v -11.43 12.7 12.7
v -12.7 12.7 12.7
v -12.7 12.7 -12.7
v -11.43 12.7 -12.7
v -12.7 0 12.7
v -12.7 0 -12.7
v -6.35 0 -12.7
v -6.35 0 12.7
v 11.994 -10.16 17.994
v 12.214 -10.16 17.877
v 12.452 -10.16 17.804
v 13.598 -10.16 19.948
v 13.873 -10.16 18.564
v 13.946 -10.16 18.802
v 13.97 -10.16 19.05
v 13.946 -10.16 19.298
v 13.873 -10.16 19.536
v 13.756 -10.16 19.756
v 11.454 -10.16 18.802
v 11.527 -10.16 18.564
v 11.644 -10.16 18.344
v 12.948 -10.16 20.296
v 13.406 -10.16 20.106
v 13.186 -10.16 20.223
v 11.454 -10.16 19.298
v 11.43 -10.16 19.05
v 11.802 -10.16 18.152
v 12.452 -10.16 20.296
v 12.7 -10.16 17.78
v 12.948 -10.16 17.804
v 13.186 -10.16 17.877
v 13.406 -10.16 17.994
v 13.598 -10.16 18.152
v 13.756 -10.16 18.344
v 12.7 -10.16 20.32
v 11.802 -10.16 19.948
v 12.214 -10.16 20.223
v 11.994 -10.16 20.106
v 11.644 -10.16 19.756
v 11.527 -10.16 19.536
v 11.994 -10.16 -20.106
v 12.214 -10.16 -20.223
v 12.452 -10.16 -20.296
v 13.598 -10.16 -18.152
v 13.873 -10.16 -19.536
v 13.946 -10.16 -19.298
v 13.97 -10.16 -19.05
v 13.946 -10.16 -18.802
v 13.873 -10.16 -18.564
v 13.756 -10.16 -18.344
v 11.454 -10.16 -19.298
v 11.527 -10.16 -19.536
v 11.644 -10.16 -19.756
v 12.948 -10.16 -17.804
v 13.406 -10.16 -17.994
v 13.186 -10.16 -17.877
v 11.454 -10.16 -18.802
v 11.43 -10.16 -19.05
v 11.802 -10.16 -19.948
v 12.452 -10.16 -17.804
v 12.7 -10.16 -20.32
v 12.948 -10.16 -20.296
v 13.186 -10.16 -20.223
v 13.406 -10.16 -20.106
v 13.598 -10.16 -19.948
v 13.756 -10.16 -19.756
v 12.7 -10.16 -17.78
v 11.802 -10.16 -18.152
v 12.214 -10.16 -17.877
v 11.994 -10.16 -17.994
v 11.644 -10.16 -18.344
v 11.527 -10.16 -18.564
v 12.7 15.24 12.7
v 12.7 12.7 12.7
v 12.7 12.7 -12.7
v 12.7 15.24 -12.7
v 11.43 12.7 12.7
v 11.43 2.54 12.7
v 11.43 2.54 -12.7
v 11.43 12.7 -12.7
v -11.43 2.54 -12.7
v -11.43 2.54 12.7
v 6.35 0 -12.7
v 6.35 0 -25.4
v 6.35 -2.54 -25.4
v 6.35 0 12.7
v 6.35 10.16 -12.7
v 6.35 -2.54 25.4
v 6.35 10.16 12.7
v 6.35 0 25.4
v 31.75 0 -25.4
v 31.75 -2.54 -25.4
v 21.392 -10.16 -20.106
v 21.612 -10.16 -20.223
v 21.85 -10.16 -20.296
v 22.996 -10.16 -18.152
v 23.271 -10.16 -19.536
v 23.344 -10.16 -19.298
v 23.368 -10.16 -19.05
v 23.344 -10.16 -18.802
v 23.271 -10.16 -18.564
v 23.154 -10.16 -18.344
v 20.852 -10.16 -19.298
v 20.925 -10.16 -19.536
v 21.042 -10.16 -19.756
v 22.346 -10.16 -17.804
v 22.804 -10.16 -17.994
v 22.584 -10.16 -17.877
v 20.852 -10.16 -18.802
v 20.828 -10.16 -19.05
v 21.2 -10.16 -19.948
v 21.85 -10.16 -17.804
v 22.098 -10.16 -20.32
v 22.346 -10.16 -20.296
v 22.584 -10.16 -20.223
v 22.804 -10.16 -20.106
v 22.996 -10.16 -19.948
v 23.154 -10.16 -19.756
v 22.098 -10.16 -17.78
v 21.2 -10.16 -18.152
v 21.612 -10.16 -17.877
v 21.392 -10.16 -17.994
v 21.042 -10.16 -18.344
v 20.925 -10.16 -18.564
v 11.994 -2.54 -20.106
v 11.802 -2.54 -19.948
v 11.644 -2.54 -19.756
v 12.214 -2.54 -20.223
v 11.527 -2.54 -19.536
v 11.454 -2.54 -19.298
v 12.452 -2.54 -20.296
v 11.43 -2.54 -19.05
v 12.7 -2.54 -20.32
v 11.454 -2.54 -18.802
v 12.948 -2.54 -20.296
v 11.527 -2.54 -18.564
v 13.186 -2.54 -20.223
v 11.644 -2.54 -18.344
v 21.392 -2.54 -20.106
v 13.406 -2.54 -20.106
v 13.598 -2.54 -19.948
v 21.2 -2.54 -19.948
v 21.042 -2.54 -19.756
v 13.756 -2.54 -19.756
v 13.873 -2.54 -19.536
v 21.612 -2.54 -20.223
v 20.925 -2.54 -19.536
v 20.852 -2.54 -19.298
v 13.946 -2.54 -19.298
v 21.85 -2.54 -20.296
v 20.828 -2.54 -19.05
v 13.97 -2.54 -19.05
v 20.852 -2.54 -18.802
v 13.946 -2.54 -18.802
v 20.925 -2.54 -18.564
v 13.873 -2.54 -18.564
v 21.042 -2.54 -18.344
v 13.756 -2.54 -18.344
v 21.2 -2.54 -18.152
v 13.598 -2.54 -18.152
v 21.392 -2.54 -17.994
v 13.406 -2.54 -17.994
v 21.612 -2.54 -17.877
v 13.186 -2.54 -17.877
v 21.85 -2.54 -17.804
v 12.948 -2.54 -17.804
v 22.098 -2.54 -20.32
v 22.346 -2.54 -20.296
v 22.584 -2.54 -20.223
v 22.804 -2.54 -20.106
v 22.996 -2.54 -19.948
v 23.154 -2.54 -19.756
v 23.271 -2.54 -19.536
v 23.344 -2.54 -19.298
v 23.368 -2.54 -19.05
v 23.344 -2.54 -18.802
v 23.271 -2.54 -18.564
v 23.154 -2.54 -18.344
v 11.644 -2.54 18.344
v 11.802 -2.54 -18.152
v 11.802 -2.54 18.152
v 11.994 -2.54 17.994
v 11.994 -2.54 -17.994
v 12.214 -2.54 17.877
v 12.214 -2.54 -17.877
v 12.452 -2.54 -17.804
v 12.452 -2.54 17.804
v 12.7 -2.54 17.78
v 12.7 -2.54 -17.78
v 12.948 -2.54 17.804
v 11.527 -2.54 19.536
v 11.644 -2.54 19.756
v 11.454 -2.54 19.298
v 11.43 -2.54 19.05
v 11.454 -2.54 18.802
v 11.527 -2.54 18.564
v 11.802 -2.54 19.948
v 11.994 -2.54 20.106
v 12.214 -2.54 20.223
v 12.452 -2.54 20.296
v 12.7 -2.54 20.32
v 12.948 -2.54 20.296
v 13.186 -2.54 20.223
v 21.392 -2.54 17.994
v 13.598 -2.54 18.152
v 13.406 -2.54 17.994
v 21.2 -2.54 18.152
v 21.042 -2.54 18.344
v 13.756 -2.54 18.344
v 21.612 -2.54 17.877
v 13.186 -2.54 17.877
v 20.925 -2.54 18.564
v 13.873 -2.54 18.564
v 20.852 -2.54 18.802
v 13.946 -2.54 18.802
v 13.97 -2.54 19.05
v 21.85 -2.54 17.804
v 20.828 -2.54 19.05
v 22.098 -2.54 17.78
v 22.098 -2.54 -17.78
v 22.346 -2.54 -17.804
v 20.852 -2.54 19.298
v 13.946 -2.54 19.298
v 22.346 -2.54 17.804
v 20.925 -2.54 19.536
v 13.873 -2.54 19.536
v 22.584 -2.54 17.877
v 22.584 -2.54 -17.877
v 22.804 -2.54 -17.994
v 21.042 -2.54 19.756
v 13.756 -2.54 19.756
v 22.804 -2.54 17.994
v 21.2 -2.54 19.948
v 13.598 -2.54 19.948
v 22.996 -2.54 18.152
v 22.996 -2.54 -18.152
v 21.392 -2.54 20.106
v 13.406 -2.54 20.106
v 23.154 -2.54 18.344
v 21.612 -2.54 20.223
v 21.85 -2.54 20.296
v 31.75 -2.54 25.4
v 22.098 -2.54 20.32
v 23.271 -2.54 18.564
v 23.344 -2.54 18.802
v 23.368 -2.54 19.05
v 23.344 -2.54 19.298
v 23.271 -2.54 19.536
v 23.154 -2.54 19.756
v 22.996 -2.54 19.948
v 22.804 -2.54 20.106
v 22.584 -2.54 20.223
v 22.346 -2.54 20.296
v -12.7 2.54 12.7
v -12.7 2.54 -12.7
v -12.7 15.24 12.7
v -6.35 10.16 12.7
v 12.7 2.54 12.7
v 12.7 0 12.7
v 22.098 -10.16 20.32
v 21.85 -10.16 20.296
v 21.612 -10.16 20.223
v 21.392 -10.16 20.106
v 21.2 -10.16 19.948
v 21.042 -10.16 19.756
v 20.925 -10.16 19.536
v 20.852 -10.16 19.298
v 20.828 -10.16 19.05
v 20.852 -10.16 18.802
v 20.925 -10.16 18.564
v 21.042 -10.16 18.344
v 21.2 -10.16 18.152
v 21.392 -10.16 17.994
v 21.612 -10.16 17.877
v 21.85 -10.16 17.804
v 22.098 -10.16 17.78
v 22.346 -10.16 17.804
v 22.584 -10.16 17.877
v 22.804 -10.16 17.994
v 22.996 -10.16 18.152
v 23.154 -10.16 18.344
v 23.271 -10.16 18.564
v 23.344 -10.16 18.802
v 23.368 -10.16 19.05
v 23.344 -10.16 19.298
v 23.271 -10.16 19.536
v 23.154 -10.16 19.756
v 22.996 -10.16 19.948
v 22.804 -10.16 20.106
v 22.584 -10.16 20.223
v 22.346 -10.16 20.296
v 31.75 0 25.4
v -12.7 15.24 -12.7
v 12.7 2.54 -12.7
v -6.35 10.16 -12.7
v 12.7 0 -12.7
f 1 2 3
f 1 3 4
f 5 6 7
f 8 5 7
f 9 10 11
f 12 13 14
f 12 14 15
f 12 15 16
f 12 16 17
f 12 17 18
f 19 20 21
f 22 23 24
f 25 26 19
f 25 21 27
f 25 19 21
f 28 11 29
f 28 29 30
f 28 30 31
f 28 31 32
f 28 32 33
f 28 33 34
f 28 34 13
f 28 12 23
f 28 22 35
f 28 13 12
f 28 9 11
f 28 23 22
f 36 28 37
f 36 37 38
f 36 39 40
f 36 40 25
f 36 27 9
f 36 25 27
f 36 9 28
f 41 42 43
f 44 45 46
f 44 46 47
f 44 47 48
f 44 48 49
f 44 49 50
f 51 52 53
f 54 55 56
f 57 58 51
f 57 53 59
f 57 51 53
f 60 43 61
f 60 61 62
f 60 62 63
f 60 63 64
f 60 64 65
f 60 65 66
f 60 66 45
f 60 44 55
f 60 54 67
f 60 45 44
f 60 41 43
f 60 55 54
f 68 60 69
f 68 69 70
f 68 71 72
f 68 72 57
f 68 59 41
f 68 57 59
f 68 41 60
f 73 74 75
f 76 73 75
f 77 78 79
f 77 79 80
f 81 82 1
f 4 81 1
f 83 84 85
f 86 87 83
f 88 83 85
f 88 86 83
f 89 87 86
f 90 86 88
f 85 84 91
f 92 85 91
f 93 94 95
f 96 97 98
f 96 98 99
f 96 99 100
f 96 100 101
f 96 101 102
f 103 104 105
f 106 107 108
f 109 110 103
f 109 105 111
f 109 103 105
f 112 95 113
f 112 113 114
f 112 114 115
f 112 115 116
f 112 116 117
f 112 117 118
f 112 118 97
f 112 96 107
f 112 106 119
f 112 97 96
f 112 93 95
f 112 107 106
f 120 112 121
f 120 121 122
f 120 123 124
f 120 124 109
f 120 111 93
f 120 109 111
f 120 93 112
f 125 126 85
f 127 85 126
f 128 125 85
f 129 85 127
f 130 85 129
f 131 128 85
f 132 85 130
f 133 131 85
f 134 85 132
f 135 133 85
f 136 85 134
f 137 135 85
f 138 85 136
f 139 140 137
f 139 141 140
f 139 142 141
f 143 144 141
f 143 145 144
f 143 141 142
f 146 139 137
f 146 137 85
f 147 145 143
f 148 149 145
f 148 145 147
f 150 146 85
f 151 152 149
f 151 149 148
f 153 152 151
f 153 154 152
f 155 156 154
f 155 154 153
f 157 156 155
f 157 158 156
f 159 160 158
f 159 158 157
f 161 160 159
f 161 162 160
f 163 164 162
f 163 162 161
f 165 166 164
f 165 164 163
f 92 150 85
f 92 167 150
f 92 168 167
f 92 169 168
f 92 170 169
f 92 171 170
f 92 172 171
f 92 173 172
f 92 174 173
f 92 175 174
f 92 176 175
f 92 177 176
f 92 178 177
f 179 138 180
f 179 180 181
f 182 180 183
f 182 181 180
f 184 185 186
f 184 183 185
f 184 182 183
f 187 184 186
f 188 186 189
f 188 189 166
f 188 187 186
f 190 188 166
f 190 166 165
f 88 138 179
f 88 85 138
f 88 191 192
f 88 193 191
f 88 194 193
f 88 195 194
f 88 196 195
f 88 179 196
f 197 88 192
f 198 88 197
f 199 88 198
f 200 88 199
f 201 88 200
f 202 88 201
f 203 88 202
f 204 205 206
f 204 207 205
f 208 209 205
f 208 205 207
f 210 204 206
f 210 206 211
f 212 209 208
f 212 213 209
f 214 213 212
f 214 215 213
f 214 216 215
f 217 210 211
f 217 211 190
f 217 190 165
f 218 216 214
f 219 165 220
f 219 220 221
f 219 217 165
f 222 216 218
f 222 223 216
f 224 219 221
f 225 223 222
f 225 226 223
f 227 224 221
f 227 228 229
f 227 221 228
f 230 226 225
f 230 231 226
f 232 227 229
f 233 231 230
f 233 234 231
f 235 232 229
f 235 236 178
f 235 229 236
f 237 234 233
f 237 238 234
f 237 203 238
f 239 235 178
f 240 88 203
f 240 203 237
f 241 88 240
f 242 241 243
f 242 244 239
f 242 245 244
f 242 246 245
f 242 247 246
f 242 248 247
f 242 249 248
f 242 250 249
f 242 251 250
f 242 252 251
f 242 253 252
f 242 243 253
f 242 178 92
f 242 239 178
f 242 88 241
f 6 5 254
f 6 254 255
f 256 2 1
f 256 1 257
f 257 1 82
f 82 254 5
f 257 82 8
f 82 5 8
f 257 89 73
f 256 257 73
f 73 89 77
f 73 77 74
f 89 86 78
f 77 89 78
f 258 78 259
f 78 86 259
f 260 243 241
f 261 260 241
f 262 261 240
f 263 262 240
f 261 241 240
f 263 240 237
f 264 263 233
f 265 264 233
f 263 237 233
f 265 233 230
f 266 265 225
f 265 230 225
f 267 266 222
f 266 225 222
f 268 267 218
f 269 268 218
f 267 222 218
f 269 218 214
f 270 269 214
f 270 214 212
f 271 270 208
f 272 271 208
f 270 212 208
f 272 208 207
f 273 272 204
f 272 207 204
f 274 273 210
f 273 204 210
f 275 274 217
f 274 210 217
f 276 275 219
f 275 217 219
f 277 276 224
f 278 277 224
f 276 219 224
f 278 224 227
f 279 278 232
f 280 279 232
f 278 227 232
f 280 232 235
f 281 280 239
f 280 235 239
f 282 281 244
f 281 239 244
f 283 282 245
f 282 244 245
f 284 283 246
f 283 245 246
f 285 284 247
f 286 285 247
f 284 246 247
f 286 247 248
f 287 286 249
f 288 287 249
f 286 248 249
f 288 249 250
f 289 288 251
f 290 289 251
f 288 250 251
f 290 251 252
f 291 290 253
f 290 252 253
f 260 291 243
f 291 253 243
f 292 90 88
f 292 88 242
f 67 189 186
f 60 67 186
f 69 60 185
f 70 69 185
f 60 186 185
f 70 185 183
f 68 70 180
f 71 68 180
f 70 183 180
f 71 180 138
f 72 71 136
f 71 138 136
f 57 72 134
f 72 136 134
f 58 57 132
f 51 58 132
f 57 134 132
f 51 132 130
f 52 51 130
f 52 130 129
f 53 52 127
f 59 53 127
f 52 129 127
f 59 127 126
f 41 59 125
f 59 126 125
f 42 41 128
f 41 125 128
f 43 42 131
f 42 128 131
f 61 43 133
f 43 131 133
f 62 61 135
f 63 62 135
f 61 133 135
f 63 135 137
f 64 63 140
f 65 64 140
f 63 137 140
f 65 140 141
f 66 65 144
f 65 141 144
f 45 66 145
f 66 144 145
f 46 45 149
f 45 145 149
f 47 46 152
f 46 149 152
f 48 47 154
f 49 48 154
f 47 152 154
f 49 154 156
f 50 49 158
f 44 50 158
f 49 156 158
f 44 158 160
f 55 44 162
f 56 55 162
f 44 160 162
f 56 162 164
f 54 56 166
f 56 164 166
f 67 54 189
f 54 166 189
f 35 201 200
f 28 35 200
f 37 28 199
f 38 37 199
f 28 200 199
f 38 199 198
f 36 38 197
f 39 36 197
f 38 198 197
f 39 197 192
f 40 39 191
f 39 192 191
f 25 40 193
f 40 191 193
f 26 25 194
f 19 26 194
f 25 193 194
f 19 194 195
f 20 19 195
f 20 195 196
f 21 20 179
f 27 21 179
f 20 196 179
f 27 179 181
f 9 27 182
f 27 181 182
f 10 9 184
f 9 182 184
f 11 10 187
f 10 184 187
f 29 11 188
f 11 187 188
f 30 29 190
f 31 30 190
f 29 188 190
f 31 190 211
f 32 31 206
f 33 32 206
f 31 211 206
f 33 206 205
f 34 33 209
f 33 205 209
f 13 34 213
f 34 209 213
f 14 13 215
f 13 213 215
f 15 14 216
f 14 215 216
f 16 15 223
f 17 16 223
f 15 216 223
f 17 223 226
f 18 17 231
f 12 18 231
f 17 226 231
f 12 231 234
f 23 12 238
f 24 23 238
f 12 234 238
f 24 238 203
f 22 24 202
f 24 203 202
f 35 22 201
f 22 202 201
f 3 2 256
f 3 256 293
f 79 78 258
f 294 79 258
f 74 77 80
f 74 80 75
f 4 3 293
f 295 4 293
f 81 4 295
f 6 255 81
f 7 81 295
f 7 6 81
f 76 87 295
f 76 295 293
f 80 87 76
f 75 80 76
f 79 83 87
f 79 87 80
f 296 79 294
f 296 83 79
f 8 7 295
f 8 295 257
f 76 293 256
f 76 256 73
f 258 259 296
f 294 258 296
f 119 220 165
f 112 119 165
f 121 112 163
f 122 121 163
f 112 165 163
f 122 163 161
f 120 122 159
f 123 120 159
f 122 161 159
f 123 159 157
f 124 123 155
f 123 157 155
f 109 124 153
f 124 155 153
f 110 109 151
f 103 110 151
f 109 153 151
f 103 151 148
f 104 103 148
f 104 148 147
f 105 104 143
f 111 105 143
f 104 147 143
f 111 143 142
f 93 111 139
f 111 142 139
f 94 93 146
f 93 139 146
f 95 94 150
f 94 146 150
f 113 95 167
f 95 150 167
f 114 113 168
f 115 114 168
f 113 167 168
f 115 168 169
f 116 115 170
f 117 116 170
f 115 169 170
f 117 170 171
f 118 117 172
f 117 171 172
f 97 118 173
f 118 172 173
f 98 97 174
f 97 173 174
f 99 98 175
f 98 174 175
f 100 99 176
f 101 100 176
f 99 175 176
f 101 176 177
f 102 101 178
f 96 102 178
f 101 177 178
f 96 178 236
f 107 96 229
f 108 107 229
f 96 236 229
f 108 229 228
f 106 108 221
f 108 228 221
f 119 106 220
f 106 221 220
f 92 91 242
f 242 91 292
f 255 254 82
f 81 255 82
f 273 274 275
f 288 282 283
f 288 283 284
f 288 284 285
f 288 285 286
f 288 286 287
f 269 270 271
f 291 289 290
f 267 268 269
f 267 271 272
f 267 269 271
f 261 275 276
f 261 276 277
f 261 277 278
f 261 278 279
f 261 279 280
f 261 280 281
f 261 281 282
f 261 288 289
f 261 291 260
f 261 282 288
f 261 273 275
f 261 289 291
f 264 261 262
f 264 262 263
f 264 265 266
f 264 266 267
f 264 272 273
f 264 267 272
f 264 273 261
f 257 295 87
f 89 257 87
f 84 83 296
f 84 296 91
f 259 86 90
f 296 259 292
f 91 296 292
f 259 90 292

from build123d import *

# Parameters (mm, degrees)
SKETCH1_W           = 25.4
SKETCH1_H           = 25.4
BOSS_EXTRUDE1_DEPTH = 15.24
SKETCH2_W           = 12.7
SKETCH2_H           = 25.4
CUT_EXTRUDE1_DEPTH  = 10.16
SKETCH3_W           = 1.27
SKETCH3_H           = 10.16
CUT_EXTRUDE2_DEPTH  = 33.228986953
SKETCH4_W           = 25.4
SKETCH4_H           = 50.8
BOSS_EXTRUDE2_DEPTH = 2.54
SKETCH5_R           = 1.27
BOSS_EXTRUDE3_DEPTH = 7.62


with BuildPart() as part:
    # Sketch1 → Boss-Extrude1 (new body)
    with BuildSketch(Plane(origin=(0, 0, 0), x_dir=(1, 0, 0), z_dir=(0, 1, 0))):
        Rectangle(SKETCH1_W, SKETCH1_H)
    extrude(amount=BOSS_EXTRUDE1_DEPTH)

    # Sketch2 → Cut-Extrude1 (cut)
    with BuildSketch(Plane.XZ):
        Rectangle(SKETCH2_W, SKETCH2_H)
    extrude(amount=-CUT_EXTRUDE1_DEPTH, mode=Mode.SUBTRACT)

    # Sketch3 → Cut-Extrude2 (cut, through all)
    with BuildSketch(Plane.XY.offset(12.7)):
        with Locations((-12.065, 7.62)):
            Rectangle(SKETCH3_W, SKETCH3_H)
        with Locations((12.065, 7.62)):
            Rectangle(SKETCH3_W, SKETCH3_H)
    extrude(amount=-CUT_EXTRUDE2_DEPTH, mode=Mode.SUBTRACT)

    # Sketch4 → Boss-Extrude2 (add)
    with BuildSketch(Plane.XZ):
        with Locations((19.05, 0)):
            Rectangle(SKETCH4_W, SKETCH4_H)
    extrude(amount=BOSS_EXTRUDE2_DEPTH)

    # Sketch5 → Boss-Extrude3 (add)
    with BuildSketch(Plane.XZ.offset(2.54)):
        with Locations(Location((12.7, 19.05, 0), (0, 0, 90))):
            Circle(SKETCH5_R)
        with Locations(Location((22.098, 19.05, 0), (0, 0, 90))):
            Circle(SKETCH5_R)
        with Locations(Location((12.7, -19.05, 0), (0, 0, 90))):
            Circle(SKETCH5_R)
        with Locations(Location((22.098, -19.05, 0), (0, 0, 90))):
            Circle(SKETCH5_R)
    extrude(amount=BOSS_EXTRUDE3_DEPTH)


solid = part.part
